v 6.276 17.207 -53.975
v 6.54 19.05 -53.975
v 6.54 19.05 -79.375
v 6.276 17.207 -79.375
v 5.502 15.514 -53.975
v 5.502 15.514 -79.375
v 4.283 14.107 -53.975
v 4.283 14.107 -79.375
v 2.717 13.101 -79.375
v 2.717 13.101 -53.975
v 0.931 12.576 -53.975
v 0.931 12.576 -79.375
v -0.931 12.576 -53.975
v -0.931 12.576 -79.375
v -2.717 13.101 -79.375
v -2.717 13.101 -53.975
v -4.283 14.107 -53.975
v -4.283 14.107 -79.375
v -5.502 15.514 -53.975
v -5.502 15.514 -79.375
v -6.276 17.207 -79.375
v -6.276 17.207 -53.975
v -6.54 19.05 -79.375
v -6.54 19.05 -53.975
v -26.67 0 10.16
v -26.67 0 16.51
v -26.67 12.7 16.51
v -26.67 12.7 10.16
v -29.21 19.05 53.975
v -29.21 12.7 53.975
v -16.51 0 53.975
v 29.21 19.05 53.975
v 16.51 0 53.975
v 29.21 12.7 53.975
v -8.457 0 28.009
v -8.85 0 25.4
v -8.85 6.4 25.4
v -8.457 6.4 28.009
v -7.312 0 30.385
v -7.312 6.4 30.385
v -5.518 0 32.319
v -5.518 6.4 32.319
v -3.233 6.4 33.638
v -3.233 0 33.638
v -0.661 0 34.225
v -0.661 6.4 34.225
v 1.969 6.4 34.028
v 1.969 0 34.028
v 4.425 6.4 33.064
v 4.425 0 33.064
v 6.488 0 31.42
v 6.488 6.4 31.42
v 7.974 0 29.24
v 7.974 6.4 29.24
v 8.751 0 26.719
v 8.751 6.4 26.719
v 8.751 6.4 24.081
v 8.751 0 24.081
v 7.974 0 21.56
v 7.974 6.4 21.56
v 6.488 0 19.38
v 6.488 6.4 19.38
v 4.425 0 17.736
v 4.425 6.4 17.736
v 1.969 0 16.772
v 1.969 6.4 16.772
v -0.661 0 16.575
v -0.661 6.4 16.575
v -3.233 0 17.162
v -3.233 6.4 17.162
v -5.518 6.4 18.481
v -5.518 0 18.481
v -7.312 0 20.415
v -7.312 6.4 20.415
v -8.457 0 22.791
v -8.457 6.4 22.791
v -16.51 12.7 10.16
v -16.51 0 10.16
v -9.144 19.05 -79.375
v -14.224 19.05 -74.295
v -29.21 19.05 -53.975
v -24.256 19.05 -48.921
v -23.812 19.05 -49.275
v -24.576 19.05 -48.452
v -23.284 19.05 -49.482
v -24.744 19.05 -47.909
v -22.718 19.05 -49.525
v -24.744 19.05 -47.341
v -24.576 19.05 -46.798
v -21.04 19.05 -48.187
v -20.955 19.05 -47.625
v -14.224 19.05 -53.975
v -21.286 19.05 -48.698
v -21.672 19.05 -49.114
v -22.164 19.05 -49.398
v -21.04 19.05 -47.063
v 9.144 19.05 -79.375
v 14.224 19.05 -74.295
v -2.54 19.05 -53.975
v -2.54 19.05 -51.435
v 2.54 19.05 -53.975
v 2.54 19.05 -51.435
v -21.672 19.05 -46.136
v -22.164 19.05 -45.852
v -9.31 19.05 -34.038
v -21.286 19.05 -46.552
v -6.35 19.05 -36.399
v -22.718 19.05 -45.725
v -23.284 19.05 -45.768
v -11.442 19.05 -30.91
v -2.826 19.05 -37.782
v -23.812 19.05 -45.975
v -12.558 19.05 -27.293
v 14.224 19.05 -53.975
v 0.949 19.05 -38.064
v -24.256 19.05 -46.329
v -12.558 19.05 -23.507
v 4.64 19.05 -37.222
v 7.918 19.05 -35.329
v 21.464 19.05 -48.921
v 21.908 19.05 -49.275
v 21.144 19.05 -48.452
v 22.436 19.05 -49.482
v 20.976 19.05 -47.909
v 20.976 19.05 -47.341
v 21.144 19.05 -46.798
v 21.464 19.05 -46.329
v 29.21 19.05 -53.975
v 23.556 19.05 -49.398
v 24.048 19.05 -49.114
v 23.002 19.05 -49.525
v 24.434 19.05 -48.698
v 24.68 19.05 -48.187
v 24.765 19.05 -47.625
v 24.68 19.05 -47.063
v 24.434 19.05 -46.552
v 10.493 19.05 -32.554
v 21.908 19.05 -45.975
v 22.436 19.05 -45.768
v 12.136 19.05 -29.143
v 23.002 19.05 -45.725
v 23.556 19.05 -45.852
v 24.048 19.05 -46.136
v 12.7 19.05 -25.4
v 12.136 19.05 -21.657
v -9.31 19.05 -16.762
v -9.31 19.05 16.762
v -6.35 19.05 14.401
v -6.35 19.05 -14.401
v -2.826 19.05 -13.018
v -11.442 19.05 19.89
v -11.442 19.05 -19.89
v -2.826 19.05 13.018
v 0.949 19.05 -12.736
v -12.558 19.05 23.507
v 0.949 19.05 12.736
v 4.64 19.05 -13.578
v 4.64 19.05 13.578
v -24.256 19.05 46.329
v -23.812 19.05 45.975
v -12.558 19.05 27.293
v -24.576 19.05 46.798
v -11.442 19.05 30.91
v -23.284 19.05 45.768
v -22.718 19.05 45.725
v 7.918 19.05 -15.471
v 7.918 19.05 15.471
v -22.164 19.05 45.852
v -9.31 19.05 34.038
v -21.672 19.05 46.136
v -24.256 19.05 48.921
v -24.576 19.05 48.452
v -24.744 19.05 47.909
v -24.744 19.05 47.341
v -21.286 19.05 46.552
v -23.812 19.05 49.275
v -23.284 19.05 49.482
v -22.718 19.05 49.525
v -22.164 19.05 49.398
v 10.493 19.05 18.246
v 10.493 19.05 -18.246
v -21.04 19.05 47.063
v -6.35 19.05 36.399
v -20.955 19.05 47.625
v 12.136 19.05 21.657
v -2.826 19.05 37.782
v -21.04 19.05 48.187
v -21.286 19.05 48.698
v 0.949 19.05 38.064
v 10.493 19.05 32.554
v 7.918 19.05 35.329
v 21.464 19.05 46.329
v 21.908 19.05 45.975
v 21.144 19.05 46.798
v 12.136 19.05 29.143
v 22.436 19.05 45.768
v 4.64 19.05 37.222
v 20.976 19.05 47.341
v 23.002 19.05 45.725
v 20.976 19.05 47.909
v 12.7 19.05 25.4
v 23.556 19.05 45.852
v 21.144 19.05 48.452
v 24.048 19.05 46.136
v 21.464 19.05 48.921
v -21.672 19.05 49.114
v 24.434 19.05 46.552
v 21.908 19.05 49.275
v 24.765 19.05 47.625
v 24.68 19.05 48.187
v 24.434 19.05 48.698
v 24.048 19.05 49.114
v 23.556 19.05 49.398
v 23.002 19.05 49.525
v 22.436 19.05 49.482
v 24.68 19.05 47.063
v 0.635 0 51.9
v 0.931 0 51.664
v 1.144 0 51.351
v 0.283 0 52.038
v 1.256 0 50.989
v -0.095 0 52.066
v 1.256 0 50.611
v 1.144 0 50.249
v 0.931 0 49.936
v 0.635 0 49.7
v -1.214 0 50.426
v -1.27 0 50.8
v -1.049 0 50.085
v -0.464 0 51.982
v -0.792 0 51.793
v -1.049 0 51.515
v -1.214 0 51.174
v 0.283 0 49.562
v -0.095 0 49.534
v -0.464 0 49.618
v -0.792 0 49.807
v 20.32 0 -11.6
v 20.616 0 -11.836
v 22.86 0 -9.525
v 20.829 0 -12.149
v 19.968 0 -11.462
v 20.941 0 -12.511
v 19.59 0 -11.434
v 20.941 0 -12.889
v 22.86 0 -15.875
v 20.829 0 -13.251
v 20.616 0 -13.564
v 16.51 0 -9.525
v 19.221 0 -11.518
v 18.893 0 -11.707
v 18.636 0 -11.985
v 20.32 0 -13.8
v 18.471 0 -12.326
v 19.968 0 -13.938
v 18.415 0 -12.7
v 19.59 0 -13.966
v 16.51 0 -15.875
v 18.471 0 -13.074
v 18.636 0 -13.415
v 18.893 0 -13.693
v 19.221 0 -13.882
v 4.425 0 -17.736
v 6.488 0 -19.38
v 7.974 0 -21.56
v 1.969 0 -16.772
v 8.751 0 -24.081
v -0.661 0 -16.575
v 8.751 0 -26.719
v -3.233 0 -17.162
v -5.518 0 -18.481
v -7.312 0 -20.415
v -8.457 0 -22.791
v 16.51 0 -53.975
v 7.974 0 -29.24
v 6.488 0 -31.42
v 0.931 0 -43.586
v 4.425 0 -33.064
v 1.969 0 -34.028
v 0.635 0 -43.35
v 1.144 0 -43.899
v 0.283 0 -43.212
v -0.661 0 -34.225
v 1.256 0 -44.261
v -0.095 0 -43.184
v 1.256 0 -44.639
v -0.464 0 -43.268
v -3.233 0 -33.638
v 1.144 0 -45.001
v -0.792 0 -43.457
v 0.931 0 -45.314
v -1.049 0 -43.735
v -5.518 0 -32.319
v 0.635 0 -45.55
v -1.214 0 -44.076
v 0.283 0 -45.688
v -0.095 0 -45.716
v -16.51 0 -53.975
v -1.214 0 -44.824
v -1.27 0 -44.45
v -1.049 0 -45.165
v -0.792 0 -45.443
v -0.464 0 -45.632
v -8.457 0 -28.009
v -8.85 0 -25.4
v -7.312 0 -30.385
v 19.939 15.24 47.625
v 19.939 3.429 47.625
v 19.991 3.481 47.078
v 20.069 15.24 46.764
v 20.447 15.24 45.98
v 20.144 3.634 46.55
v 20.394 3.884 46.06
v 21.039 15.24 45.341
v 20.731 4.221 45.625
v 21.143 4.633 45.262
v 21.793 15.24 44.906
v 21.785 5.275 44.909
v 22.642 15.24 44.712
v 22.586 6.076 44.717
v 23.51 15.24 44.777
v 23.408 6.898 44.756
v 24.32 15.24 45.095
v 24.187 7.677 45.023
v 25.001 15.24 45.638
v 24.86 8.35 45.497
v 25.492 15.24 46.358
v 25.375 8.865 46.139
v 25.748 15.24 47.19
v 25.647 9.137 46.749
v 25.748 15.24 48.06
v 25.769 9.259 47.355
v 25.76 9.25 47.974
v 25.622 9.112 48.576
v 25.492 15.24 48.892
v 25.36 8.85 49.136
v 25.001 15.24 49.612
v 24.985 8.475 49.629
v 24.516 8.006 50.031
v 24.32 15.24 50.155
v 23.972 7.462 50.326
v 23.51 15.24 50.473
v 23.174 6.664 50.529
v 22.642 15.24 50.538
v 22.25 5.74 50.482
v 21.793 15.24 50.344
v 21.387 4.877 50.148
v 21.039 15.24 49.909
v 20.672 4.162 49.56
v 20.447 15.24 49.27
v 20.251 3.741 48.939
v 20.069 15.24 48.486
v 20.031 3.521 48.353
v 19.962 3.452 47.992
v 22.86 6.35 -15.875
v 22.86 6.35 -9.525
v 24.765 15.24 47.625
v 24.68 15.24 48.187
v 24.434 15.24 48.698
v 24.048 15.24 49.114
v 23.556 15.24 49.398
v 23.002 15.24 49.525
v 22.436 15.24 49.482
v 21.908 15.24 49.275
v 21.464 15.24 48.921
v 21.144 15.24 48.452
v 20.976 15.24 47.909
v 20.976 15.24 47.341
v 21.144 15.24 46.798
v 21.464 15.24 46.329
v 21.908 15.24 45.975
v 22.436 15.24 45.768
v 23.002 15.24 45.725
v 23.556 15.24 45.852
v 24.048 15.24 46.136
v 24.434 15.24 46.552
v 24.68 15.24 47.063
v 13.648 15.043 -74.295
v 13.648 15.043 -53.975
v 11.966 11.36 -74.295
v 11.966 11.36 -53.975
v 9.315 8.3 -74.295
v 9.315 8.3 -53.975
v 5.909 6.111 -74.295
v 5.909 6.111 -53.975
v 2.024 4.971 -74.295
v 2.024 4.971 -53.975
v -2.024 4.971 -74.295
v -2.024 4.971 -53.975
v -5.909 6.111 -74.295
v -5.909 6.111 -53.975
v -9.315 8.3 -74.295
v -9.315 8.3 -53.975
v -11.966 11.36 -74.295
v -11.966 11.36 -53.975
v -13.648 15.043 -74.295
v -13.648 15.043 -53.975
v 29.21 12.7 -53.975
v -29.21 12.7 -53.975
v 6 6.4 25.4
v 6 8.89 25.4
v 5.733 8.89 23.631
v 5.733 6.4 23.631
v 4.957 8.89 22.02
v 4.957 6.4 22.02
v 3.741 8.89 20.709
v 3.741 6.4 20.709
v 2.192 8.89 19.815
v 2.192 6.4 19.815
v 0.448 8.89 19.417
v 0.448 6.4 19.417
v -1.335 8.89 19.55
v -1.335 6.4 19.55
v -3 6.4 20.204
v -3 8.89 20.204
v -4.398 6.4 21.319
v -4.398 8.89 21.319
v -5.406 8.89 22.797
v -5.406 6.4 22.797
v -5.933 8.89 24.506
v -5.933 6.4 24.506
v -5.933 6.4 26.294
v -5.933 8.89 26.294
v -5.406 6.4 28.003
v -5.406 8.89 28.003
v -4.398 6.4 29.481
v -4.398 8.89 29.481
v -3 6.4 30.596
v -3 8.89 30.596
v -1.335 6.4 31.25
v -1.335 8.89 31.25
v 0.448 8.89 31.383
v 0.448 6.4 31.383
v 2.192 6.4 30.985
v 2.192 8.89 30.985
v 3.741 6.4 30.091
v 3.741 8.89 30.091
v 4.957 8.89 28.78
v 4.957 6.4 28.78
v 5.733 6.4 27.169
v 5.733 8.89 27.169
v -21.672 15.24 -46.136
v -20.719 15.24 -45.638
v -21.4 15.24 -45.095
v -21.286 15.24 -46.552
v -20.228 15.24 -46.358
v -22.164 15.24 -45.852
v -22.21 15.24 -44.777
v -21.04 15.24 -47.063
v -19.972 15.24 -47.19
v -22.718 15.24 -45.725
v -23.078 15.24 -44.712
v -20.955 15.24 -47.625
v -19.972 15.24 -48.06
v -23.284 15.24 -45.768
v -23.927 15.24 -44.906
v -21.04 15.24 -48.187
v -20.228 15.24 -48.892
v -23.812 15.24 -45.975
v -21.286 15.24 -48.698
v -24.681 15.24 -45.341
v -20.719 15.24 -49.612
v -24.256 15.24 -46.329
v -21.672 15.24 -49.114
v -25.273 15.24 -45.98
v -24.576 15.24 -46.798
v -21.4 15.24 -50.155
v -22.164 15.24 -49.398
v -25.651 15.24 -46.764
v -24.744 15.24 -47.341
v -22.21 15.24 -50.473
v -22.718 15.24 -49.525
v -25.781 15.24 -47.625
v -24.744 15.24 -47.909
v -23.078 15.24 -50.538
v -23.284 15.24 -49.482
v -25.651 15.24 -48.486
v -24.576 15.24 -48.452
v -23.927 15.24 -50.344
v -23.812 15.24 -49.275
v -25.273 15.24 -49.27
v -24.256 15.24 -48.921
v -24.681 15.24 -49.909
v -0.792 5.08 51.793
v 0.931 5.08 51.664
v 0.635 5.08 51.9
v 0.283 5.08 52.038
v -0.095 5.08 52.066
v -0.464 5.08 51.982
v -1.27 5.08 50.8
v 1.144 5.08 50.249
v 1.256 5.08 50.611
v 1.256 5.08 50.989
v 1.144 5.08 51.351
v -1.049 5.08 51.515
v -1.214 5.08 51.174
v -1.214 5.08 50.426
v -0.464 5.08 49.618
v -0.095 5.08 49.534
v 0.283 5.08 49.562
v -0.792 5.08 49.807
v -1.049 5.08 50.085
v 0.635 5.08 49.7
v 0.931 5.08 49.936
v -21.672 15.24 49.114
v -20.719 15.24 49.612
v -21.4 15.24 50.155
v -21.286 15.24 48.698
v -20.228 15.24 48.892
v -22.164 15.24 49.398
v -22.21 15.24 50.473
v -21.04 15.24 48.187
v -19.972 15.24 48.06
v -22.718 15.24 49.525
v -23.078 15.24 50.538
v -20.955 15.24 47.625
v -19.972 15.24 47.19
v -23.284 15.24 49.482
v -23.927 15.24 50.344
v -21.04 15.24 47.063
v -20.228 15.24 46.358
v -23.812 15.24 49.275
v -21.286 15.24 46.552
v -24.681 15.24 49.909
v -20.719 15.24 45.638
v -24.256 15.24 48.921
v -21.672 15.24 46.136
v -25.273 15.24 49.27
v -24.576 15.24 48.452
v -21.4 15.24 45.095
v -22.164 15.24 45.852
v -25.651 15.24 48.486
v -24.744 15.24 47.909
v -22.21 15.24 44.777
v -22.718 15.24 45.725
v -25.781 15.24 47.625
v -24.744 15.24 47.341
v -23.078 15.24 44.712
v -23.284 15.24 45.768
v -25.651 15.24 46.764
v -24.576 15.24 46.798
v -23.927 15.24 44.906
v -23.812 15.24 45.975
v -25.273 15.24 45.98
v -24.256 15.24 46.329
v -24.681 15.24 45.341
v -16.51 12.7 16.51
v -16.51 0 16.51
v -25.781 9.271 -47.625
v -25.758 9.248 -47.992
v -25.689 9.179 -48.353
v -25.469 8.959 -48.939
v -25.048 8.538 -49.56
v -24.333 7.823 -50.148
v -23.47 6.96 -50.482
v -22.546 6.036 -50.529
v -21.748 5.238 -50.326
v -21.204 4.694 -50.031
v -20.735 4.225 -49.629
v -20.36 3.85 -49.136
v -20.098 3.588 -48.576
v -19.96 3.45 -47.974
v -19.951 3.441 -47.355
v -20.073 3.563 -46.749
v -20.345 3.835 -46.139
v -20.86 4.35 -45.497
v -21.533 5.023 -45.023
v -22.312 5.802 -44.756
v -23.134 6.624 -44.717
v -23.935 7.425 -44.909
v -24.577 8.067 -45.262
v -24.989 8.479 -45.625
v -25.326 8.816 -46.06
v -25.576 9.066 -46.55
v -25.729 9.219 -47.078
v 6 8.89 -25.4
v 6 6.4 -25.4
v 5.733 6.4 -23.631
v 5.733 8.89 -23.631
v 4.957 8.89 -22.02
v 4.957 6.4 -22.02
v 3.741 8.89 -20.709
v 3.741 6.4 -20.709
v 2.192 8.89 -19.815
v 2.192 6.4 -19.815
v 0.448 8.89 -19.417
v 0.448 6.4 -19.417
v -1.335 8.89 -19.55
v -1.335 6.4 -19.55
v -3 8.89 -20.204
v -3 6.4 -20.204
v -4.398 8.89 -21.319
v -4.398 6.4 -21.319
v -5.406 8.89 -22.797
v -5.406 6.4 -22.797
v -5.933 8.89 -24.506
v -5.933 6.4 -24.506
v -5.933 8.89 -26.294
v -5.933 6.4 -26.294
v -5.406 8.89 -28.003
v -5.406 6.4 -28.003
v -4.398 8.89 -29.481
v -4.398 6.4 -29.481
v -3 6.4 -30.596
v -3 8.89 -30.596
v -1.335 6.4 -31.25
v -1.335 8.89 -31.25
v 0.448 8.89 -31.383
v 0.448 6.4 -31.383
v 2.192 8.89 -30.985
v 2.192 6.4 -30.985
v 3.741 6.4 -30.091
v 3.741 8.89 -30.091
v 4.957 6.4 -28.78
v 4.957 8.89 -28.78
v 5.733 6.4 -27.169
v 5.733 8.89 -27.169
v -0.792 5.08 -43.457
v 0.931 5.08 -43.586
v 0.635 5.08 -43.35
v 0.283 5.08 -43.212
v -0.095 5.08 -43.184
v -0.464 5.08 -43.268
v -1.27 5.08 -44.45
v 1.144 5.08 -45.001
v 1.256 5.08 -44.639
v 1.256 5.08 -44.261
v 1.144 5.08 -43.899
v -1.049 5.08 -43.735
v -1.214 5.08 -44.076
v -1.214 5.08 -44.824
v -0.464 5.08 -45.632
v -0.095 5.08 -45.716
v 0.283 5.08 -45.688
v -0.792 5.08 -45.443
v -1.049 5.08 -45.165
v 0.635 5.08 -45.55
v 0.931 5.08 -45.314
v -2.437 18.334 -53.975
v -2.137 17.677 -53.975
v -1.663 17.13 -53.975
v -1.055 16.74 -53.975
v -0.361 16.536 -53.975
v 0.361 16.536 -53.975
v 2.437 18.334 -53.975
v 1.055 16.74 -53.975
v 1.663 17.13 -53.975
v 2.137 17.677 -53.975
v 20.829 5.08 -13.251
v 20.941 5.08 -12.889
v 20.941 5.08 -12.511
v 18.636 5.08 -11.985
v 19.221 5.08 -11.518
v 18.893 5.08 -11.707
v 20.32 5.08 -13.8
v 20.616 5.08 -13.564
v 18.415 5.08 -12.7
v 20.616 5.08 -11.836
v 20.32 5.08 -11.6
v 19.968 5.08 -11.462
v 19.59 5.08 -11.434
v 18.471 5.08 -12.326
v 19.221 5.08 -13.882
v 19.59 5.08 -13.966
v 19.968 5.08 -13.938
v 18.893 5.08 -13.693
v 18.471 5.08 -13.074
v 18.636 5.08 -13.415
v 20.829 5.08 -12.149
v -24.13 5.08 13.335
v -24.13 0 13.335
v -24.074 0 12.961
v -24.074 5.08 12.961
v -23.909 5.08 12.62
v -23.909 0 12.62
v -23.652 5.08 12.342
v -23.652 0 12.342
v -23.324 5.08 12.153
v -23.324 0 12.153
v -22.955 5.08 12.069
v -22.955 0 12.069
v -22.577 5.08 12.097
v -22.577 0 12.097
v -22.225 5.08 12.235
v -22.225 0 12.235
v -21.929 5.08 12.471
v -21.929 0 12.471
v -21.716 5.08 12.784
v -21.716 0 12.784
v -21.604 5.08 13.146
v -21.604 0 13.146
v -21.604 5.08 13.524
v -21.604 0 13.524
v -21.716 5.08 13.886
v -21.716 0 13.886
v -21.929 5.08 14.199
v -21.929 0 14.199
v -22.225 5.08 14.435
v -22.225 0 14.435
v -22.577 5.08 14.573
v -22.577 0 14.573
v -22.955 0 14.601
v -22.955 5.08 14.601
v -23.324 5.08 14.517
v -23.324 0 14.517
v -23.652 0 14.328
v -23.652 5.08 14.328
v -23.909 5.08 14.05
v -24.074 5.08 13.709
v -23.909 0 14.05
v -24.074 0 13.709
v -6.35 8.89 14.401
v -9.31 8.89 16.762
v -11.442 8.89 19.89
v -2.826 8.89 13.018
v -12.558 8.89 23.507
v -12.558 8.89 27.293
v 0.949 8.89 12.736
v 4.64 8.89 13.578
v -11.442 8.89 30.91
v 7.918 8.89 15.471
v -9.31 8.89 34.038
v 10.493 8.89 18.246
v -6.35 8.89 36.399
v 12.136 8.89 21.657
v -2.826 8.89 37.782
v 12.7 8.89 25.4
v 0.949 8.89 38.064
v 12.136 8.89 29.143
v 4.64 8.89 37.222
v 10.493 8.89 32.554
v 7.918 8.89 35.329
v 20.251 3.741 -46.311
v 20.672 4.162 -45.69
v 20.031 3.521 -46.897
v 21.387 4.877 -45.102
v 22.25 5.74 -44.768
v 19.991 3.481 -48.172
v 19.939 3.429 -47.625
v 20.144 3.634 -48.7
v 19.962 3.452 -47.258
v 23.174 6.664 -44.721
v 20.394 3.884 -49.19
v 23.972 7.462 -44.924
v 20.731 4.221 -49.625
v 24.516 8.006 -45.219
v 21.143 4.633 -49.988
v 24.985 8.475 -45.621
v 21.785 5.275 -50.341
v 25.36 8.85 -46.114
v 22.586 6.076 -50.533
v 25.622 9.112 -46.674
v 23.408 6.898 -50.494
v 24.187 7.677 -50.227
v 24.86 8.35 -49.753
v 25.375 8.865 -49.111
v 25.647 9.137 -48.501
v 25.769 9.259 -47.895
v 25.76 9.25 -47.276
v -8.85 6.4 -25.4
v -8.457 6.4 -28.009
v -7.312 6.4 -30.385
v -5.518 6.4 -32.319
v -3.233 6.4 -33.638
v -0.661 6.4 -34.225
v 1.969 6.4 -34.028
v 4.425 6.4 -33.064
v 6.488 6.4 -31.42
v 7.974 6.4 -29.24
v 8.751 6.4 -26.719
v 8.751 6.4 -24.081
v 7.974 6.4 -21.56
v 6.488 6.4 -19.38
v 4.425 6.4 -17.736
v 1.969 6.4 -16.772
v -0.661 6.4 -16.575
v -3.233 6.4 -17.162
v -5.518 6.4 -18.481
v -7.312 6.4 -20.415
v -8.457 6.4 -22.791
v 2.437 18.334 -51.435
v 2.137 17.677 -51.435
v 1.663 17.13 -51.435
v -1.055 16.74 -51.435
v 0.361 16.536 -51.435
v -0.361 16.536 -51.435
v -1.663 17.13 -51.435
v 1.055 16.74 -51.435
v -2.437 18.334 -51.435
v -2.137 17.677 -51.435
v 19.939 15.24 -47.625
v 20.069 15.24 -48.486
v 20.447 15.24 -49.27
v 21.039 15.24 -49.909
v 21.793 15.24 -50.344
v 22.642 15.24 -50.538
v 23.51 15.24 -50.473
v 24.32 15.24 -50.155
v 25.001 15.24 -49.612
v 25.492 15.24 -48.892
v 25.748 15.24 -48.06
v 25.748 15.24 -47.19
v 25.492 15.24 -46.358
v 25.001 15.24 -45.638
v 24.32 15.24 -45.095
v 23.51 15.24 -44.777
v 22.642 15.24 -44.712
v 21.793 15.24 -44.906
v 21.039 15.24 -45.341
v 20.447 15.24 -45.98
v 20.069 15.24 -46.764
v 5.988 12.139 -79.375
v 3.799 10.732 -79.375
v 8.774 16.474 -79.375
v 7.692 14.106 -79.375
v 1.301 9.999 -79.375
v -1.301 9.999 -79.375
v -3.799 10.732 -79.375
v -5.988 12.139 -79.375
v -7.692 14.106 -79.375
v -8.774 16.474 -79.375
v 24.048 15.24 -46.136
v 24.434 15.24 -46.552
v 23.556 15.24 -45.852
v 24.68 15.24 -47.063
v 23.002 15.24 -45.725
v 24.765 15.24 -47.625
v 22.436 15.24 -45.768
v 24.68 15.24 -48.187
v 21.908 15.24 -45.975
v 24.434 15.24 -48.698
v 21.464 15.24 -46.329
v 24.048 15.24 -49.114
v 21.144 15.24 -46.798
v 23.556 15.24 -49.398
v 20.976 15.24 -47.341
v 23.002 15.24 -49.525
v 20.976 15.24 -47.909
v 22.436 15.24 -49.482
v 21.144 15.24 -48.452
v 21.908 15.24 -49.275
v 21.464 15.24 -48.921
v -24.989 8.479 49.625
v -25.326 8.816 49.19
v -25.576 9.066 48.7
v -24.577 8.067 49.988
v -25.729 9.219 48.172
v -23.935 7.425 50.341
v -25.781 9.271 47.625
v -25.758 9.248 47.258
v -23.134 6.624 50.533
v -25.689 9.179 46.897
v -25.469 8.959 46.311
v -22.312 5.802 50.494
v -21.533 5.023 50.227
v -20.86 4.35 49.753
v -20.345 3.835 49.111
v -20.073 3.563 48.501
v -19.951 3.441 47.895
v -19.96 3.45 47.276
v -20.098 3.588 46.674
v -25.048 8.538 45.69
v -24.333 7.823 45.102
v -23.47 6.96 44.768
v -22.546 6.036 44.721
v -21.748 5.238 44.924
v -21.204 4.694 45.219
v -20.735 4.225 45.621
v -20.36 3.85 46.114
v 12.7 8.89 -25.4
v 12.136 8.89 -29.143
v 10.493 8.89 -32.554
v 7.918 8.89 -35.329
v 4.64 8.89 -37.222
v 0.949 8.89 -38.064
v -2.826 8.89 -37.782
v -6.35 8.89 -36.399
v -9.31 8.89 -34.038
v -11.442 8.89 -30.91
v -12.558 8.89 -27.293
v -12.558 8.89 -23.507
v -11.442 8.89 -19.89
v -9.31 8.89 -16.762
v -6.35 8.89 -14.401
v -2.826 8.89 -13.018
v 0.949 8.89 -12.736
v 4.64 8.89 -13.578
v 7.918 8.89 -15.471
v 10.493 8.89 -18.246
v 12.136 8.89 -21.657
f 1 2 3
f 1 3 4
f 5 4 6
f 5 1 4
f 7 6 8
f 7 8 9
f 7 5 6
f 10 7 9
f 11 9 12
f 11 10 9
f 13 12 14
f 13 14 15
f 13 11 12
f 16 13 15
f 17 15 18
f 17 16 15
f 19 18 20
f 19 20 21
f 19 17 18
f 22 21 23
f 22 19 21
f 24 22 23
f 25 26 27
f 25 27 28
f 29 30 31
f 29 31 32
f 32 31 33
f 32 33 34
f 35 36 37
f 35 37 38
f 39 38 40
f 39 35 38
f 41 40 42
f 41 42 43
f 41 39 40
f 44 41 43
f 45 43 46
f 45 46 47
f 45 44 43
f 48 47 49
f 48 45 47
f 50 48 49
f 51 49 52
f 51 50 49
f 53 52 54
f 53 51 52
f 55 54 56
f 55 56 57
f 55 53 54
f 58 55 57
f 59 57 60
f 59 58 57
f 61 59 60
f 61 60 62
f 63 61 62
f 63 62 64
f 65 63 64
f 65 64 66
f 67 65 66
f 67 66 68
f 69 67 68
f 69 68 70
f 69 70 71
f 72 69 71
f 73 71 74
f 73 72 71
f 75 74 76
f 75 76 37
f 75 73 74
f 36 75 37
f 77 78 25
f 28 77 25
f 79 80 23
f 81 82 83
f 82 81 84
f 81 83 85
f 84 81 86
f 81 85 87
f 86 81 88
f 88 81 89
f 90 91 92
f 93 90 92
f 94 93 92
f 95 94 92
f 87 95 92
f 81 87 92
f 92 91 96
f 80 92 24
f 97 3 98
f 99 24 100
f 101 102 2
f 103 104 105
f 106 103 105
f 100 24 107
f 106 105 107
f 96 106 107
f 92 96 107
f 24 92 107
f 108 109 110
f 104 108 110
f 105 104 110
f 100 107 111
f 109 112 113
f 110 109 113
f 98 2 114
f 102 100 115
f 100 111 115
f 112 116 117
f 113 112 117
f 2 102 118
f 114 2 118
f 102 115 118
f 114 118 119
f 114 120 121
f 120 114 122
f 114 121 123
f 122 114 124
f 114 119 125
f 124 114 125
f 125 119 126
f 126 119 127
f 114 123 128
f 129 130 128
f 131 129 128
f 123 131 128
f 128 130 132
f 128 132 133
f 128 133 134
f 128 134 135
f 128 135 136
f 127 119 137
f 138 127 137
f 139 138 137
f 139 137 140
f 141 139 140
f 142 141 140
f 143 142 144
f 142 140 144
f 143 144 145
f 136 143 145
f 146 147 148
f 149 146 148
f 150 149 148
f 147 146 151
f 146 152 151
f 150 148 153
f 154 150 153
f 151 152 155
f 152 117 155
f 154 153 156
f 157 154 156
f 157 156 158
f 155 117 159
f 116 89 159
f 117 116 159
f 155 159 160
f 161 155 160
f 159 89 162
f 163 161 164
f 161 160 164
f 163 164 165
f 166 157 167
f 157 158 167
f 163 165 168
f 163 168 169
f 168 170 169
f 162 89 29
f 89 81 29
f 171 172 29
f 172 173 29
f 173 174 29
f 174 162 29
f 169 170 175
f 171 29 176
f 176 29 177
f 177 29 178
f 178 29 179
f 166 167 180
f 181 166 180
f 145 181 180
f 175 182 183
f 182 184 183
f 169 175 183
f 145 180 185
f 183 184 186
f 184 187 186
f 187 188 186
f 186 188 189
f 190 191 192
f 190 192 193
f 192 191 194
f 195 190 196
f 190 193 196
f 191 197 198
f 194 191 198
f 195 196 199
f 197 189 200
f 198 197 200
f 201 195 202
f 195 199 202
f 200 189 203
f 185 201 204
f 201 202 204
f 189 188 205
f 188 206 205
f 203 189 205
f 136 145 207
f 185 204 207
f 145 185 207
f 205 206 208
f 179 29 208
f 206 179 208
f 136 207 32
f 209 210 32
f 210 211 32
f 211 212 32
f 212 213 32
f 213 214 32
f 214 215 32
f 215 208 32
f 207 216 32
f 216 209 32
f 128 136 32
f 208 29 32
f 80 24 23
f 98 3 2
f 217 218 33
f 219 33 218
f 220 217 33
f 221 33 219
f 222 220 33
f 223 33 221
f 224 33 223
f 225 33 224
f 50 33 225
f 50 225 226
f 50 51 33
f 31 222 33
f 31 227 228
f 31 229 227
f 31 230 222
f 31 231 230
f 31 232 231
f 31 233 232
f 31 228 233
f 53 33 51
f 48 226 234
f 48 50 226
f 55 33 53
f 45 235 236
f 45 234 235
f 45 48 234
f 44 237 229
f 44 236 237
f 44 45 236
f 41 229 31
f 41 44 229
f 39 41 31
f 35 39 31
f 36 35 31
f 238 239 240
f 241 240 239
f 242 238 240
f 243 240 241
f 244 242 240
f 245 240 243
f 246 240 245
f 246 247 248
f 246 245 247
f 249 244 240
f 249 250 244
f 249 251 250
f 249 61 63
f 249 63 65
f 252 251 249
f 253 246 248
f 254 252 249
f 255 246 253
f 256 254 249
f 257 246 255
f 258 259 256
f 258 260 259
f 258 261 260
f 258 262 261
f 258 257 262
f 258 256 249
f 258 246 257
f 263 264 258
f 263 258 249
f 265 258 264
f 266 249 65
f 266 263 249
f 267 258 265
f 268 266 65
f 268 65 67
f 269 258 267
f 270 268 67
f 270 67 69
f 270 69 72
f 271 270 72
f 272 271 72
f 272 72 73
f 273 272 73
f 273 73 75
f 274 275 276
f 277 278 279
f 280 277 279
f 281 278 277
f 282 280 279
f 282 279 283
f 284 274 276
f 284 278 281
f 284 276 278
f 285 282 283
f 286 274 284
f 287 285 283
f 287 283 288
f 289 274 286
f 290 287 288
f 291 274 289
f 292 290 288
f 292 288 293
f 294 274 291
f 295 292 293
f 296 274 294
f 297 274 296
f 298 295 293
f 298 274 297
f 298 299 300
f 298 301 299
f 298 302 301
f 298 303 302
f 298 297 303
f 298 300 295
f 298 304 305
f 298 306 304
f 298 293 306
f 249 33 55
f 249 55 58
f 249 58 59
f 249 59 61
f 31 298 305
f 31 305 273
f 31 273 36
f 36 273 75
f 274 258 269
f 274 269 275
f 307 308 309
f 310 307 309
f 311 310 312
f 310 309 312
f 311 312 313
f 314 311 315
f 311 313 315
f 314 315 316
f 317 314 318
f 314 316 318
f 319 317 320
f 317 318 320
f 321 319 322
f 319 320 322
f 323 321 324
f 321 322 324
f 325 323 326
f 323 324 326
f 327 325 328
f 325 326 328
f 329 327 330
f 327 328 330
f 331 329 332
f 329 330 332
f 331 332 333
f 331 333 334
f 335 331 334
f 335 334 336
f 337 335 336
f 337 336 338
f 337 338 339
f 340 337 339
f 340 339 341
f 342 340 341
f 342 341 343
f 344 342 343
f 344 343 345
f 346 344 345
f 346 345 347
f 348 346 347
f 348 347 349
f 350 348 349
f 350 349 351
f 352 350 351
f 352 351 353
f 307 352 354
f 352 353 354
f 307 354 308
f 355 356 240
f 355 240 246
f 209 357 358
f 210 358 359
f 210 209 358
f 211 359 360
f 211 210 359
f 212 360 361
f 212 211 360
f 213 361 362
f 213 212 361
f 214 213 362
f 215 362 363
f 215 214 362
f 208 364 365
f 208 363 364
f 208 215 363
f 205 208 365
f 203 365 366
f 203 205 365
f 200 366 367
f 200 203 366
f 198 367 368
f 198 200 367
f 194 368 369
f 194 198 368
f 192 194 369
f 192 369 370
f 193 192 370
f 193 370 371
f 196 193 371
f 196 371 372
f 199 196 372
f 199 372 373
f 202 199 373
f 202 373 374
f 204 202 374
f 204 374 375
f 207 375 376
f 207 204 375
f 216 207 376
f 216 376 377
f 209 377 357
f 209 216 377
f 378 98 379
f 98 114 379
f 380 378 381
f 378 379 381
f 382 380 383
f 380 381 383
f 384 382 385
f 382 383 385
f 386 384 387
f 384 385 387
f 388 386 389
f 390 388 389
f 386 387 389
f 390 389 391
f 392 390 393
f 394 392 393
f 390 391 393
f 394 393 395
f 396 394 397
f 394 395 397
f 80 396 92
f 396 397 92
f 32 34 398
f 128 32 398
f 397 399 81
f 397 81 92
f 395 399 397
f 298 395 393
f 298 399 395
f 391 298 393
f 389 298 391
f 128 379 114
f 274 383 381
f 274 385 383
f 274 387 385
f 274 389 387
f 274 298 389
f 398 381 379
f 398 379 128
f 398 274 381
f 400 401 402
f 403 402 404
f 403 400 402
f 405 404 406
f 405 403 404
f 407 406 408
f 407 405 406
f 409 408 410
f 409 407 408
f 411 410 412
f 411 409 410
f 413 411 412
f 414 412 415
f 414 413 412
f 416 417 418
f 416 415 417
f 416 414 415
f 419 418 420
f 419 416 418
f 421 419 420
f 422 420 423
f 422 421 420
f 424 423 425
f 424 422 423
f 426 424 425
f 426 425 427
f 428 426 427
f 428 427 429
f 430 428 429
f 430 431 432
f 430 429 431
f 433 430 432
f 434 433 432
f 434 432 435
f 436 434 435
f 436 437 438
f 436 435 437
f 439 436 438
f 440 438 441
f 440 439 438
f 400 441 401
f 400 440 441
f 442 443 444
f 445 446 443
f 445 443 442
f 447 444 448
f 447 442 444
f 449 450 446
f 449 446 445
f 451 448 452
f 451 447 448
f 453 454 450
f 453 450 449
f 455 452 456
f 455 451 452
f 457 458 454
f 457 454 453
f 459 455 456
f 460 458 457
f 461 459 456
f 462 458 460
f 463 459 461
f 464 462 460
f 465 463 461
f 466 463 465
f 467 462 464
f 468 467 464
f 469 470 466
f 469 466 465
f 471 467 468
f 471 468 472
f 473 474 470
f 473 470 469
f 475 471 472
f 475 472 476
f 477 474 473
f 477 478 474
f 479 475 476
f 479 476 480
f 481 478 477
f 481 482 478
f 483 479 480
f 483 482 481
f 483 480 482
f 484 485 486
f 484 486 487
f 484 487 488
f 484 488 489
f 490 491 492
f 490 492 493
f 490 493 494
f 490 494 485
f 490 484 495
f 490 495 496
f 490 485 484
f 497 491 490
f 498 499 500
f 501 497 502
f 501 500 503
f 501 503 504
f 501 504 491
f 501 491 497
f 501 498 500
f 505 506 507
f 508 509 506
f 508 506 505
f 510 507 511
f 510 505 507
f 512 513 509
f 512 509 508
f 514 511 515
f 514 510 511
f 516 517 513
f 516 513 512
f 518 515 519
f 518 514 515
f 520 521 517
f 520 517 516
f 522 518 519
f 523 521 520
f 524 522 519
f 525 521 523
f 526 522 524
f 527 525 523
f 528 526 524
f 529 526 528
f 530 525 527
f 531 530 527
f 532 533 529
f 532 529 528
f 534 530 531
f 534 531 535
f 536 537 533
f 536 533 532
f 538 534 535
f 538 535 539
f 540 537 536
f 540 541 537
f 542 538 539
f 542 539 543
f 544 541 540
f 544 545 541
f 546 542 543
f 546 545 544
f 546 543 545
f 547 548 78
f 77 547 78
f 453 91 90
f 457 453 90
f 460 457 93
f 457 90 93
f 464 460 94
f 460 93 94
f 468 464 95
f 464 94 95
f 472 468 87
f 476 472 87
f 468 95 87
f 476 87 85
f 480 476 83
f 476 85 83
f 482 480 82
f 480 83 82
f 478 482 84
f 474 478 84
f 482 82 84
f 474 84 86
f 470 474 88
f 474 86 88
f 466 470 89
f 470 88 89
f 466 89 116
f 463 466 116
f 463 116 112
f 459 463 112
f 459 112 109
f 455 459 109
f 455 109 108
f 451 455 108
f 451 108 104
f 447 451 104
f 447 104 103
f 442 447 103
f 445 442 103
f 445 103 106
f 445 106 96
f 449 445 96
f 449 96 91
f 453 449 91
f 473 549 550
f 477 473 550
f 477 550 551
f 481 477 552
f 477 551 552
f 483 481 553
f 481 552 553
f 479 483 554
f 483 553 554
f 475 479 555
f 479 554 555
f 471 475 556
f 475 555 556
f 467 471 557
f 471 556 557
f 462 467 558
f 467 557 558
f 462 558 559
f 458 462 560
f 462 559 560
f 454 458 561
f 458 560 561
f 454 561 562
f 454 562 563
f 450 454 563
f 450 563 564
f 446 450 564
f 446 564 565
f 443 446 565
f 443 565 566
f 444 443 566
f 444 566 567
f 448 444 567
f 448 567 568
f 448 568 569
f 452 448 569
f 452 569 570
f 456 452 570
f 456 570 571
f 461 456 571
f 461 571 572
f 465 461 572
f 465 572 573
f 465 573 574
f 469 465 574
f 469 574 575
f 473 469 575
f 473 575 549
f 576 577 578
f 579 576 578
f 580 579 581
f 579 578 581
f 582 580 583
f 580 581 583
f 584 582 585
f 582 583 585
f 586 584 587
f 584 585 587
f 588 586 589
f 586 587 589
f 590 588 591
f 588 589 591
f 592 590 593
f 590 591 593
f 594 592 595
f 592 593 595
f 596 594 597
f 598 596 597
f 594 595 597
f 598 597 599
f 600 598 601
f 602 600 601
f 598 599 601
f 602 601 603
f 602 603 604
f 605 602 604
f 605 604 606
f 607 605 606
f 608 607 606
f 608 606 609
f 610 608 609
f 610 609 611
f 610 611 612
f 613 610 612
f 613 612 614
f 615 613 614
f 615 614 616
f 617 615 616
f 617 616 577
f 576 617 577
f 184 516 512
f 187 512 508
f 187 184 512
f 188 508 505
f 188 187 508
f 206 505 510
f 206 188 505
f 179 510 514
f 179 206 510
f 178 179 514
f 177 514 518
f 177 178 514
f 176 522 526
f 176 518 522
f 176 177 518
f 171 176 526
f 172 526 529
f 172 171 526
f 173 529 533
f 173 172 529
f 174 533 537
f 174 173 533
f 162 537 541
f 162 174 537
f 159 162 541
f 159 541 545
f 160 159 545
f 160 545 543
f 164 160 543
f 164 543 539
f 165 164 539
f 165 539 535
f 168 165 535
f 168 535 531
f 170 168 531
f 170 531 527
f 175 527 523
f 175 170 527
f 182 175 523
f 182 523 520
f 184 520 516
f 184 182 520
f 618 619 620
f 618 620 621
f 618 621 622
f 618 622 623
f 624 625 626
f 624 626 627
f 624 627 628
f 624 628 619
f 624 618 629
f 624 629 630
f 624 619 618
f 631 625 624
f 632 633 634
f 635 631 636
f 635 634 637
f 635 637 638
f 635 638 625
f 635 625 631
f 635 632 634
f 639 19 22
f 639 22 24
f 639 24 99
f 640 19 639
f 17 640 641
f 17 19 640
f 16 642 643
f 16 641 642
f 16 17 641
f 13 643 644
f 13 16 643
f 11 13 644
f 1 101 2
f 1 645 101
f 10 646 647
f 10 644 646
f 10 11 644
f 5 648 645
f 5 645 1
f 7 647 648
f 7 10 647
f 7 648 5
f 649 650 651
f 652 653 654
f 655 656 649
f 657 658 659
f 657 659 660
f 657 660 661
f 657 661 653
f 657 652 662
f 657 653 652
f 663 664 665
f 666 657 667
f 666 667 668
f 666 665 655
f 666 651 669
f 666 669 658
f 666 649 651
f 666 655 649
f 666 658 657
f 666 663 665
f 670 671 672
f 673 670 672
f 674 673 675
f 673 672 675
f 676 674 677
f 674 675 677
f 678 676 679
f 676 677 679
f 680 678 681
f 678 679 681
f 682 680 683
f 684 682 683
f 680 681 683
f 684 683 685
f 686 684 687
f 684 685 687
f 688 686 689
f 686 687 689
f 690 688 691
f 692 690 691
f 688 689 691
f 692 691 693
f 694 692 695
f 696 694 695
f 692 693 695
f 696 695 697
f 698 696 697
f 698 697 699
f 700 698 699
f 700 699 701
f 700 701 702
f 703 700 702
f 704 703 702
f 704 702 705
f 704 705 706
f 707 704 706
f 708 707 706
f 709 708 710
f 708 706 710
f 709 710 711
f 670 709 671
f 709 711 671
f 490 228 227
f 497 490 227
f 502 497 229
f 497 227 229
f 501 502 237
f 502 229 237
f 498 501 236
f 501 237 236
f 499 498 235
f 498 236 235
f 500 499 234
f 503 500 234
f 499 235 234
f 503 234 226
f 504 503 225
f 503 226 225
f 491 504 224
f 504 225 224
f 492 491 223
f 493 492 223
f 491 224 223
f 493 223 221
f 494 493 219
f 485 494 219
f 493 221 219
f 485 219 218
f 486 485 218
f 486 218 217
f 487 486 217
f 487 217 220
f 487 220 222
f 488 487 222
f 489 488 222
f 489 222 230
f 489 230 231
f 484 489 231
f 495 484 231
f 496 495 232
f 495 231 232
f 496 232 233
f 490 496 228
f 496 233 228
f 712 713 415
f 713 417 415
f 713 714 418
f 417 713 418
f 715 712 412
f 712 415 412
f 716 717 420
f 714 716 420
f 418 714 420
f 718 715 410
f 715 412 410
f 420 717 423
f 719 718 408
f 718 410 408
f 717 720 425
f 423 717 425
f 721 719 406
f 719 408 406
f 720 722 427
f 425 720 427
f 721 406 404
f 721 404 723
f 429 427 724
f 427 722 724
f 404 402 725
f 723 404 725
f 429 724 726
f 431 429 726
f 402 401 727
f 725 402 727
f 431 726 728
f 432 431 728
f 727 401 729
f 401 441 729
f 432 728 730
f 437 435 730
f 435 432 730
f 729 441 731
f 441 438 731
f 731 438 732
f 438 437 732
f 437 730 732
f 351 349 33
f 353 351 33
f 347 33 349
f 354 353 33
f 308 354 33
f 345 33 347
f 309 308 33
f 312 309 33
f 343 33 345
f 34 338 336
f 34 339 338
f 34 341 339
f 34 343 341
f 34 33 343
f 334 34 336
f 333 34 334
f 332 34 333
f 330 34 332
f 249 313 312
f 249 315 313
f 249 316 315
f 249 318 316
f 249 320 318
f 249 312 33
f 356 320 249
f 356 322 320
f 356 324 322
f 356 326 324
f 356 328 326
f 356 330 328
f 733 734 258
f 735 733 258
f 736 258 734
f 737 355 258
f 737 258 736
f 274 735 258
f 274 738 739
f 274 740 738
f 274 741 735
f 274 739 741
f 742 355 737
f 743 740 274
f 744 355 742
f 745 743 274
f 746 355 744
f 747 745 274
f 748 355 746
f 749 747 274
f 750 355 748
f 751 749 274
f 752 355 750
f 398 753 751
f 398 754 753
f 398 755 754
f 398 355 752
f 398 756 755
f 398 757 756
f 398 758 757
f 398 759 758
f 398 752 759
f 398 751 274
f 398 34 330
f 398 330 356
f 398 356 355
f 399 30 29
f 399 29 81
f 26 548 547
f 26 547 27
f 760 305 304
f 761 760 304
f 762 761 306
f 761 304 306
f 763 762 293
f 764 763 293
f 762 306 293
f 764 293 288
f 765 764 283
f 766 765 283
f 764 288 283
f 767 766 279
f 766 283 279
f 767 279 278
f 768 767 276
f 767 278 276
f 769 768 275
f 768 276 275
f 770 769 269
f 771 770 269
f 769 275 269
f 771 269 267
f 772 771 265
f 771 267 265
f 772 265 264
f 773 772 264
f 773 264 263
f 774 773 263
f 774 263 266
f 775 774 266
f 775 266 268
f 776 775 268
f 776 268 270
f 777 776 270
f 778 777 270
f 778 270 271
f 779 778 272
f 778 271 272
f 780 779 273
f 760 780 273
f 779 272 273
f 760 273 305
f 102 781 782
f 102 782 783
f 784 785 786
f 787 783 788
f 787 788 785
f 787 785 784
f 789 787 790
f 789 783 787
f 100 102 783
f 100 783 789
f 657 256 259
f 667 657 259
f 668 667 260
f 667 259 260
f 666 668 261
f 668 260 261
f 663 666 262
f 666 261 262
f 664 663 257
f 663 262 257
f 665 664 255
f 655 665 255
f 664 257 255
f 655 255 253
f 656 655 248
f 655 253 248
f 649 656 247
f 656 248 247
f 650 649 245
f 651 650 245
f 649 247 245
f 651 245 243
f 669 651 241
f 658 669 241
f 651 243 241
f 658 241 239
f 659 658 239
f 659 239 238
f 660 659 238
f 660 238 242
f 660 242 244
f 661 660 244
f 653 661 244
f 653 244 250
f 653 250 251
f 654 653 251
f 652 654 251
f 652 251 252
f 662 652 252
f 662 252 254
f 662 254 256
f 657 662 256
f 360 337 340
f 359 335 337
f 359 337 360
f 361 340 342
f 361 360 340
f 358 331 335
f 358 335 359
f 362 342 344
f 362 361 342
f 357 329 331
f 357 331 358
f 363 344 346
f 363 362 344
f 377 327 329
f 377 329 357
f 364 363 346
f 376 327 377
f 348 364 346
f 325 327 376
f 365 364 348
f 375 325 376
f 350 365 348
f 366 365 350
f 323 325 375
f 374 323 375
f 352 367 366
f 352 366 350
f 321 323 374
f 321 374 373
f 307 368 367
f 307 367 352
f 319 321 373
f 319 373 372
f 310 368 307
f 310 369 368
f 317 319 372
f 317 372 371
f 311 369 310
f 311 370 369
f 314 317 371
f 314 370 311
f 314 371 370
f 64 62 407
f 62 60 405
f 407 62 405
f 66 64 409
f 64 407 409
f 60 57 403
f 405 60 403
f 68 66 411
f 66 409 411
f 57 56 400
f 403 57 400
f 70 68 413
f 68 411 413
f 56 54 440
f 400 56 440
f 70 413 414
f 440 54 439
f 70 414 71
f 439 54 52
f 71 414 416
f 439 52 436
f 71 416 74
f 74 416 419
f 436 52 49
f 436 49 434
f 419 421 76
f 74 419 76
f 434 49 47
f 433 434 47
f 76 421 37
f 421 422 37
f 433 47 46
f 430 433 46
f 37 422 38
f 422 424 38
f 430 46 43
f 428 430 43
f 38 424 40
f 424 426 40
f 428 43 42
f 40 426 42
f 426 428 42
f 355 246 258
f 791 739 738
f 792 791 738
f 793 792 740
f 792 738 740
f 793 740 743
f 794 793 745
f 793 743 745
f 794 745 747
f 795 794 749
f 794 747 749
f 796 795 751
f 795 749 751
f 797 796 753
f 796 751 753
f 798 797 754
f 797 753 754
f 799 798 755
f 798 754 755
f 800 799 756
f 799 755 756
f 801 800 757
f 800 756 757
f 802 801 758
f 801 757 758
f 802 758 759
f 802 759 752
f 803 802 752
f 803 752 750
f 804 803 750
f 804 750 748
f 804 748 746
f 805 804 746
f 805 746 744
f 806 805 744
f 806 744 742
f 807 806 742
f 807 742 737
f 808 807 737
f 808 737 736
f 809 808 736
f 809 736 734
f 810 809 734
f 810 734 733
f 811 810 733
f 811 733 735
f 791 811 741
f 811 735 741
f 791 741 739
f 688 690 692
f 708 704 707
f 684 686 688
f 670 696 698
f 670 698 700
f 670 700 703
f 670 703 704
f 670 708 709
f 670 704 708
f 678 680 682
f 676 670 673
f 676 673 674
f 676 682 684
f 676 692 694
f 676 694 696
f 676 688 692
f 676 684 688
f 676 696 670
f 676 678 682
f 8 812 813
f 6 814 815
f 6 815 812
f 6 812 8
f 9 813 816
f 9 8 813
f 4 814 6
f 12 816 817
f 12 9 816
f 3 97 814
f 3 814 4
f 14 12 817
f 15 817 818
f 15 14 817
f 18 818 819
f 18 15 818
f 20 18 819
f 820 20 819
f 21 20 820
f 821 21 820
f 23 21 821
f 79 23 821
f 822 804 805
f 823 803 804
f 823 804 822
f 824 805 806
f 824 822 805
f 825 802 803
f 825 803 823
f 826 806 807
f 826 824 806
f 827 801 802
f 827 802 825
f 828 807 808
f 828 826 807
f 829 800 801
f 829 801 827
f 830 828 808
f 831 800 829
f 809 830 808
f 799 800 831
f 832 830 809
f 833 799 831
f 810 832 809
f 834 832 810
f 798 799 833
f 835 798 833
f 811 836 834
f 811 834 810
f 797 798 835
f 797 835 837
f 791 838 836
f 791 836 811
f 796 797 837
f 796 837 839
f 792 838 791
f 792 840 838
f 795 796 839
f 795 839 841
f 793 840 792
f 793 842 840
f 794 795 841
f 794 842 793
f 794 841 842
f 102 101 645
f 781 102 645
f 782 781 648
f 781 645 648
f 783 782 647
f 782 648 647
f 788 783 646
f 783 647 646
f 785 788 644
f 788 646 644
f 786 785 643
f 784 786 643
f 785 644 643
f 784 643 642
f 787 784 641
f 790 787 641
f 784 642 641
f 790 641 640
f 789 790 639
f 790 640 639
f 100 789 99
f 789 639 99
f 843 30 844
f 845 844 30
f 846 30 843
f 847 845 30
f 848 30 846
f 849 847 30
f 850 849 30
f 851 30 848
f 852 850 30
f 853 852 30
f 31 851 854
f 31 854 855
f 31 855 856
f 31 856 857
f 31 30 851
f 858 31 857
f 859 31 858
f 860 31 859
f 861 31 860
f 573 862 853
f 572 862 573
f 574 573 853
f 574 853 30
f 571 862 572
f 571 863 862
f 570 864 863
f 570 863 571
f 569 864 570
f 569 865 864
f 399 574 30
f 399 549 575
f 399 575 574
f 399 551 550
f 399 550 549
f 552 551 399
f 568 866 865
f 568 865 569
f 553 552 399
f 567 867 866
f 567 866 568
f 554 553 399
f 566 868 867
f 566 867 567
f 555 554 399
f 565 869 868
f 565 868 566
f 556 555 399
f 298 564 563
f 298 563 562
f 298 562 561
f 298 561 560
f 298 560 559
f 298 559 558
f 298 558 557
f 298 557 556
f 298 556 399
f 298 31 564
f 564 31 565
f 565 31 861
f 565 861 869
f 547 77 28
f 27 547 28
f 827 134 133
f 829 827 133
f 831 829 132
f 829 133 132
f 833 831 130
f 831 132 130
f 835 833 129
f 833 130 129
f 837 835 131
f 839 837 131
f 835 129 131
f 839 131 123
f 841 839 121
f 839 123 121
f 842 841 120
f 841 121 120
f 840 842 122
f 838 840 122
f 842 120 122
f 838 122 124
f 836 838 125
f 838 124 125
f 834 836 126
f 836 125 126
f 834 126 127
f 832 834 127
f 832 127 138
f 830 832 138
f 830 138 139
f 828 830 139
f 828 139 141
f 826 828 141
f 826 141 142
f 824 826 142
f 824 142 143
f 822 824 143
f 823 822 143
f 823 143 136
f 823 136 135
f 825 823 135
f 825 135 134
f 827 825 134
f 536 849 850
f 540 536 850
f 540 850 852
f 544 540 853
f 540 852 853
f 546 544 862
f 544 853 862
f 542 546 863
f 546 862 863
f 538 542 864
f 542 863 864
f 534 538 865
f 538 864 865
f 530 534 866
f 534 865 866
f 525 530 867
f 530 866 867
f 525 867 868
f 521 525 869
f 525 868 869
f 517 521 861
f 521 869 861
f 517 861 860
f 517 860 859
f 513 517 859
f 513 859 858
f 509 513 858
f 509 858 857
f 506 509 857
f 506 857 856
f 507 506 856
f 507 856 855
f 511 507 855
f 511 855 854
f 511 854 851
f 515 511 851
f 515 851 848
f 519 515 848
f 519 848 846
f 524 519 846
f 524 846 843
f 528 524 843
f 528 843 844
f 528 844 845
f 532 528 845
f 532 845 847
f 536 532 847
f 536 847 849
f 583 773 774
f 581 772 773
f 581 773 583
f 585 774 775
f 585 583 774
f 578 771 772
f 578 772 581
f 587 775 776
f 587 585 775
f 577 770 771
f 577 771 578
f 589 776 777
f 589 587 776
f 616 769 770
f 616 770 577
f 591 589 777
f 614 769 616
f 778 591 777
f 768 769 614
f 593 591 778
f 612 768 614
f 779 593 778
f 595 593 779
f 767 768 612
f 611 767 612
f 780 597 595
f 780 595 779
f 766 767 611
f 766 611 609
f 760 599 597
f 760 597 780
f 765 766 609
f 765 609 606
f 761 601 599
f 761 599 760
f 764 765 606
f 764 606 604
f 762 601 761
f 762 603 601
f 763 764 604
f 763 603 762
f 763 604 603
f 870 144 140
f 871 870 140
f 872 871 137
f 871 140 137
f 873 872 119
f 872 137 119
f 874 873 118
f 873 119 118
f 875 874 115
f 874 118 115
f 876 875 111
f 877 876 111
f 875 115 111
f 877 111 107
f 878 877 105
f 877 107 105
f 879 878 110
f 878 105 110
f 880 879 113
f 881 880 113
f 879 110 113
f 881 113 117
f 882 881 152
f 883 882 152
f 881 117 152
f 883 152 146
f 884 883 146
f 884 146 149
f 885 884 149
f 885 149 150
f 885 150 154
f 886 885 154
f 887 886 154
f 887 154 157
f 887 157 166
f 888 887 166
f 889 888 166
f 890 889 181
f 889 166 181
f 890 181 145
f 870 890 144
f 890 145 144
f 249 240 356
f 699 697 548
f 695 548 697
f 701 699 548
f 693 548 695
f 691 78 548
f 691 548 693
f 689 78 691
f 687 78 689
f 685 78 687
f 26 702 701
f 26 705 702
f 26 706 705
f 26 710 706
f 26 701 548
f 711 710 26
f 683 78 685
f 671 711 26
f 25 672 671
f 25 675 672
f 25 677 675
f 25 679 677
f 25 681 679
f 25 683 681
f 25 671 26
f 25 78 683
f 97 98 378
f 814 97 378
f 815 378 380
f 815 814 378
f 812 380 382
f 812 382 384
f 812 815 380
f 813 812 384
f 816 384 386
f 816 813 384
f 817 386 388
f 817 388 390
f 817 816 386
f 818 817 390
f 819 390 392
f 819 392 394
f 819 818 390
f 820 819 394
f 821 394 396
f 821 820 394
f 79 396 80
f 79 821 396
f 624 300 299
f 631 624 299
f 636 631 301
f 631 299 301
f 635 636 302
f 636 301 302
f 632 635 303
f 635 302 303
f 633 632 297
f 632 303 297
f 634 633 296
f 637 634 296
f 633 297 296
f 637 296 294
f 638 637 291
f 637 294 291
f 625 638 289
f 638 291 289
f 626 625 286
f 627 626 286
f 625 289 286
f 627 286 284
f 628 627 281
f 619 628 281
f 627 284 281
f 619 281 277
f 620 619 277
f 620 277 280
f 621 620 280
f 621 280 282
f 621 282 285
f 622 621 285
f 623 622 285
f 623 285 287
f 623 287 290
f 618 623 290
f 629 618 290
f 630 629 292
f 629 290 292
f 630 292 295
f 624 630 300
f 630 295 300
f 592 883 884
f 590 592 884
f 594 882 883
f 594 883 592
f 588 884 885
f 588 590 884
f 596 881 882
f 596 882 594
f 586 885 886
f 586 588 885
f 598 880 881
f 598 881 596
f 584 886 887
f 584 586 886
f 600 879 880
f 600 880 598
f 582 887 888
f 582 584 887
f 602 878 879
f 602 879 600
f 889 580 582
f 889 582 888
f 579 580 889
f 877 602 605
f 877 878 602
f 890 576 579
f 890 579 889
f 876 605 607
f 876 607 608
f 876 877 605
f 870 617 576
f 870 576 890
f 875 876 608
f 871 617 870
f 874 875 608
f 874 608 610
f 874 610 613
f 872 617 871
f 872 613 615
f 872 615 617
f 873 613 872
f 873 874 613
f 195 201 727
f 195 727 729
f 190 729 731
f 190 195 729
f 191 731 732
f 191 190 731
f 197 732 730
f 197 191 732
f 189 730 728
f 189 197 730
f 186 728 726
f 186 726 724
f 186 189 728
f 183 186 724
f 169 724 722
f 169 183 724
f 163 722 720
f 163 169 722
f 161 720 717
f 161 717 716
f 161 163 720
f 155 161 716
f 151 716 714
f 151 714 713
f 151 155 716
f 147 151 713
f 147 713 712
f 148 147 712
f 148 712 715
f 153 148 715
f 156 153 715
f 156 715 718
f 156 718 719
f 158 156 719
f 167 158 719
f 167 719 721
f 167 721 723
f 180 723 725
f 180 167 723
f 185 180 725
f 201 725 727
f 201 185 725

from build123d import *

# Parameters (mm, degrees)
SKETCH1_W           = 58.42
SKETCH1_H           = 107.95
BOSS_EXTRUDE1_DEPTH = 38.1
CHAMFER1_SIZE       = 12.7
CHAMFER2_SIZE       = 12.7
SKETCH2_R           = 14.224
SKETCH2_R_2         = 6.5405
BOSS_EXTRUDE2_DEPTH = 25.4
CHAMFER3_SIZE       = 5.08
SKETCH3_W           = 58.42
SKETCH3_H           = 22.12413995
CUT_EXTRUDE1_DEPTH  = 152.4
SKETCH4_R           = 8.85
CUT_EXTRUDE2_DEPTH  = 6.4
SKETCH5_R           = 6
CUT_EXTRUDE3_DEPTH  = 17.16
SKETCH6_R           = 12.7
CUT_EXTRUDE4_DEPTH  = 10.16
SKETCH7_R           = 2.54
CUT_EXTRUDE5_DEPTH  = 2.54
SKETCH9_R           = 1.27
CUT_EXTRUDE7_DEPTH  = 5.08
SKETCH10_W          = 6.35
SKETCH10_H          = 6.35
SKETCH10_R          = 1.27
BOSS_EXTRUDE3_DEPTH = 7.62
SKETCH11_R          = 1.27
CUT_EXTRUDE8_DEPTH  = 5.08
SKETCH12_W          = 10.16
SKETCH12_H          = 6.35
BOSS_EXTRUDE4_DEPTH = 12.7
SKETCH13_R          = 1.27
CUT_EXTRUDE9_DEPTH  = 5.08
SKETCH14_R          = 1.905
CUT_EXTRUDE10_DEPTH = 40.64
SKETCH15_R          = 2.921
CUT_EXTRUDE11_DEPTH = 15.24


with BuildPart() as part:
    # Sketch1 → Boss-Extrude1 (new body)
    with BuildSketch(Plane(origin=(0, 0, 0), x_dir=(1, 0, 0), z_dir=(0, 1, 0))):
        Rectangle(SKETCH1_W, SKETCH1_H)
    extrude(amount=BOSS_EXTRUDE1_DEPTH)

    # Chamfer1
    chamfer1_edges = [part.edges().sort_by_distance(p)[0] for p in [
        (-29.21, 38.1, 0),
    ]]
    chamfer(chamfer1_edges, length=CHAMFER1_SIZE)

    # Chamfer2
    chamfer2_edges = [part.edges().sort_by_distance(p)[0] for p in [
        (29.21, 38.1, 0),
        (-29.21, 0, 0),
        (29.21, 0, 0),
    ]]
    chamfer(chamfer2_edges, length=CHAMFER2_SIZE)

    # Sketch2 → Boss-Extrude2 (add)
    with BuildSketch(Plane(origin=(0, 0, -53.975), x_dir=(-1, 0, 0), z_dir=(0, 0, -1))):
        with Locations((0, 19.05)):
            Circle(SKETCH2_R)
        with Locations((0, 19.05)):
            Circle(SKETCH2_R_2, mode=Mode.SUBTRACT)
    extrude(amount=BOSS_EXTRUDE2_DEPTH)

    # Chamfer3
    chamfer3_edges = [part.edges().sort_by_distance(p)[0] for p in [
        (14.224, 19.05, -79.375),
    ]]
    chamfer(chamfer3_edges, length=CHAMFER3_SIZE)

    # Sketch3 → Cut-Extrude1 (cut)
    with BuildSketch(Plane.XY.offset(53.975)):
        with Locations((0, 30.112069975)):
            Rectangle(SKETCH3_W, SKETCH3_H)
    cut_extrude1 = extrude(amount=-CUT_EXTRUDE1_DEPTH, mode=Mode.SUBTRACT)

    # Sketch4 → Cut-Extrude2 (cut)
    with BuildSketch(Plane(origin=(0, 0, 0), x_dir=(-1, 0, 0), z_dir=(0, -1, 0))):
        with Locations((0, 25.4)):
            Circle(SKETCH4_R)
    cut_extrude2 = extrude(amount=-CUT_EXTRUDE2_DEPTH, mode=Mode.SUBTRACT)

    # Sketch5 → Cut-Extrude3 (cut)
    with BuildSketch(Plane.XZ.offset(-6.4)):
        with Locations((0, -25.4)):
            Circle(SKETCH5_R)
    cut_extrude3 = extrude(amount=-CUT_EXTRUDE3_DEPTH, mode=Mode.SUBTRACT)

    # Sketch6 → Cut-Extrude4 (cut)
    with BuildSketch(Plane(origin=(0, 19.05, 0), x_dir=(1, 0, 0), z_dir=(0, 1, 0))):
        with Locations((0, 25.4)):
            Circle(SKETCH6_R)
    cut_extrude4 = extrude(amount=-CUT_EXTRUDE4_DEPTH, mode=Mode.SUBTRACT)

    # Mirror1: Cut-Extrude1, Cut-Extrude2, Cut-Extrude3, Cut-Extrude4 across plane
    add(cut_extrude1.mirror(Plane.XY), mode=Mode.SUBTRACT)
    add(cut_extrude2.mirror(Plane.XY), mode=Mode.SUBTRACT)
    add(cut_extrude3.mirror(Plane.XY), mode=Mode.SUBTRACT)
    add(cut_extrude4.mirror(Plane.XY), mode=Mode.SUBTRACT)

    # Sketch7 → Cut-Extrude5 (cut)
    with BuildSketch(Plane(origin=(0, 0, -53.975), x_dir=(-1, 0, 0), z_dir=(0, 0, -1))):
        with Locations((0, 19.05)):
            Circle(SKETCH7_R)
    extrude(amount=-CUT_EXTRUDE5_DEPTH, mode=Mode.SUBTRACT)

    # Sketch9 → Cut-Extrude7 (cut)
    with BuildSketch(Plane(origin=(0, 0, 0), x_dir=(-1, 0, 0), z_dir=(0, -1, 0))):
        with Locations((0, 44.45)):
            Circle(SKETCH9_R)
        with Locations((0, -50.8)):
            Circle(SKETCH9_R)
    extrude(amount=-CUT_EXTRUDE7_DEPTH, mode=Mode.SUBTRACT)

    # Sketch10 → Boss-Extrude3 (add)
    with BuildSketch(Plane(origin=(0, 0, 0), x_dir=(-1, 0, 0), z_dir=(0, -1, 0))):
        with Locations((-19.685, 12.7)):
            Rectangle(SKETCH10_W, SKETCH10_H)
        with Locations((-19.685, 12.7)):
            Circle(SKETCH10_R, mode=Mode.SUBTRACT)
    extrude(amount=-BOSS_EXTRUDE3_DEPTH)

    # Sketch11 → Cut-Extrude8 (cut)
    with BuildSketch(Plane(origin=(0, 0, 0), x_dir=(-1, 0, 0), z_dir=(0, -1, 0))):
        with Locations((-19.685, 12.7)):
            Circle(SKETCH11_R)
    extrude(amount=-CUT_EXTRUDE8_DEPTH, mode=Mode.SUBTRACT)

    # Sketch14 → Cut-Extrude10 (cut)
    with BuildSketch(Plane(origin=(0, 19.05, 0), x_dir=(1, 0, 0), z_dir=(0, 1, 0))):
        with Locations((22.86, 47.625)):
            Circle(SKETCH14_R)
        with Locations((-22.86, 47.625)):
            Circle(SKETCH14_R)
    cut_extrude10 = extrude(amount=-CUT_EXTRUDE10_DEPTH, mode=Mode.SUBTRACT)

    # Mirror2: Cut-Extrude10 across plane
    add(cut_extrude10.mirror(Plane.XY), mode=Mode.SUBTRACT)

    # Sketch15 → Cut-Extrude11 (cut)
    with BuildSketch(Plane(origin=(0, 0, 0), x_dir=(-1, 0, 0), z_dir=(0, -1, 0))):
        with Locations((22.86, 47.625)):
            Circle(SKETCH15_R)
        with Locations((-22.86, 47.625)):
            Circle(SKETCH15_R)
        with Locations((-22.86, -47.625)):
            Circle(SKETCH15_R)
        with Locations((22.86, -47.625)):
            Circle(SKETCH15_R)
    extrude(amount=-CUT_EXTRUDE11_DEPTH, mode=Mode.SUBTRACT)


with BuildPart() as body_2:
    # Sketch12 → Boss-Extrude4 (new body)
    with BuildSketch(Plane(origin=(0, 0, 0), x_dir=(-1, 0, 0), z_dir=(0, -1, 0))):
        with Locations((21.59, -13.335)):
            Rectangle(SKETCH12_W, SKETCH12_H)
    extrude(amount=-BOSS_EXTRUDE4_DEPTH)

    # Sketch13 → Cut-Extrude9 (cut)
    with BuildSketch(Plane(origin=(0, 0, 0), x_dir=(-1, 0, 0), z_dir=(0, -1, 0))):
        with Locations((22.86, -13.335)):
            Circle(SKETCH13_R)
    extrude(amount=-CUT_EXTRUDE9_DEPTH, mode=Mode.SUBTRACT)


solid = Compound([part.part, body_2.part])
